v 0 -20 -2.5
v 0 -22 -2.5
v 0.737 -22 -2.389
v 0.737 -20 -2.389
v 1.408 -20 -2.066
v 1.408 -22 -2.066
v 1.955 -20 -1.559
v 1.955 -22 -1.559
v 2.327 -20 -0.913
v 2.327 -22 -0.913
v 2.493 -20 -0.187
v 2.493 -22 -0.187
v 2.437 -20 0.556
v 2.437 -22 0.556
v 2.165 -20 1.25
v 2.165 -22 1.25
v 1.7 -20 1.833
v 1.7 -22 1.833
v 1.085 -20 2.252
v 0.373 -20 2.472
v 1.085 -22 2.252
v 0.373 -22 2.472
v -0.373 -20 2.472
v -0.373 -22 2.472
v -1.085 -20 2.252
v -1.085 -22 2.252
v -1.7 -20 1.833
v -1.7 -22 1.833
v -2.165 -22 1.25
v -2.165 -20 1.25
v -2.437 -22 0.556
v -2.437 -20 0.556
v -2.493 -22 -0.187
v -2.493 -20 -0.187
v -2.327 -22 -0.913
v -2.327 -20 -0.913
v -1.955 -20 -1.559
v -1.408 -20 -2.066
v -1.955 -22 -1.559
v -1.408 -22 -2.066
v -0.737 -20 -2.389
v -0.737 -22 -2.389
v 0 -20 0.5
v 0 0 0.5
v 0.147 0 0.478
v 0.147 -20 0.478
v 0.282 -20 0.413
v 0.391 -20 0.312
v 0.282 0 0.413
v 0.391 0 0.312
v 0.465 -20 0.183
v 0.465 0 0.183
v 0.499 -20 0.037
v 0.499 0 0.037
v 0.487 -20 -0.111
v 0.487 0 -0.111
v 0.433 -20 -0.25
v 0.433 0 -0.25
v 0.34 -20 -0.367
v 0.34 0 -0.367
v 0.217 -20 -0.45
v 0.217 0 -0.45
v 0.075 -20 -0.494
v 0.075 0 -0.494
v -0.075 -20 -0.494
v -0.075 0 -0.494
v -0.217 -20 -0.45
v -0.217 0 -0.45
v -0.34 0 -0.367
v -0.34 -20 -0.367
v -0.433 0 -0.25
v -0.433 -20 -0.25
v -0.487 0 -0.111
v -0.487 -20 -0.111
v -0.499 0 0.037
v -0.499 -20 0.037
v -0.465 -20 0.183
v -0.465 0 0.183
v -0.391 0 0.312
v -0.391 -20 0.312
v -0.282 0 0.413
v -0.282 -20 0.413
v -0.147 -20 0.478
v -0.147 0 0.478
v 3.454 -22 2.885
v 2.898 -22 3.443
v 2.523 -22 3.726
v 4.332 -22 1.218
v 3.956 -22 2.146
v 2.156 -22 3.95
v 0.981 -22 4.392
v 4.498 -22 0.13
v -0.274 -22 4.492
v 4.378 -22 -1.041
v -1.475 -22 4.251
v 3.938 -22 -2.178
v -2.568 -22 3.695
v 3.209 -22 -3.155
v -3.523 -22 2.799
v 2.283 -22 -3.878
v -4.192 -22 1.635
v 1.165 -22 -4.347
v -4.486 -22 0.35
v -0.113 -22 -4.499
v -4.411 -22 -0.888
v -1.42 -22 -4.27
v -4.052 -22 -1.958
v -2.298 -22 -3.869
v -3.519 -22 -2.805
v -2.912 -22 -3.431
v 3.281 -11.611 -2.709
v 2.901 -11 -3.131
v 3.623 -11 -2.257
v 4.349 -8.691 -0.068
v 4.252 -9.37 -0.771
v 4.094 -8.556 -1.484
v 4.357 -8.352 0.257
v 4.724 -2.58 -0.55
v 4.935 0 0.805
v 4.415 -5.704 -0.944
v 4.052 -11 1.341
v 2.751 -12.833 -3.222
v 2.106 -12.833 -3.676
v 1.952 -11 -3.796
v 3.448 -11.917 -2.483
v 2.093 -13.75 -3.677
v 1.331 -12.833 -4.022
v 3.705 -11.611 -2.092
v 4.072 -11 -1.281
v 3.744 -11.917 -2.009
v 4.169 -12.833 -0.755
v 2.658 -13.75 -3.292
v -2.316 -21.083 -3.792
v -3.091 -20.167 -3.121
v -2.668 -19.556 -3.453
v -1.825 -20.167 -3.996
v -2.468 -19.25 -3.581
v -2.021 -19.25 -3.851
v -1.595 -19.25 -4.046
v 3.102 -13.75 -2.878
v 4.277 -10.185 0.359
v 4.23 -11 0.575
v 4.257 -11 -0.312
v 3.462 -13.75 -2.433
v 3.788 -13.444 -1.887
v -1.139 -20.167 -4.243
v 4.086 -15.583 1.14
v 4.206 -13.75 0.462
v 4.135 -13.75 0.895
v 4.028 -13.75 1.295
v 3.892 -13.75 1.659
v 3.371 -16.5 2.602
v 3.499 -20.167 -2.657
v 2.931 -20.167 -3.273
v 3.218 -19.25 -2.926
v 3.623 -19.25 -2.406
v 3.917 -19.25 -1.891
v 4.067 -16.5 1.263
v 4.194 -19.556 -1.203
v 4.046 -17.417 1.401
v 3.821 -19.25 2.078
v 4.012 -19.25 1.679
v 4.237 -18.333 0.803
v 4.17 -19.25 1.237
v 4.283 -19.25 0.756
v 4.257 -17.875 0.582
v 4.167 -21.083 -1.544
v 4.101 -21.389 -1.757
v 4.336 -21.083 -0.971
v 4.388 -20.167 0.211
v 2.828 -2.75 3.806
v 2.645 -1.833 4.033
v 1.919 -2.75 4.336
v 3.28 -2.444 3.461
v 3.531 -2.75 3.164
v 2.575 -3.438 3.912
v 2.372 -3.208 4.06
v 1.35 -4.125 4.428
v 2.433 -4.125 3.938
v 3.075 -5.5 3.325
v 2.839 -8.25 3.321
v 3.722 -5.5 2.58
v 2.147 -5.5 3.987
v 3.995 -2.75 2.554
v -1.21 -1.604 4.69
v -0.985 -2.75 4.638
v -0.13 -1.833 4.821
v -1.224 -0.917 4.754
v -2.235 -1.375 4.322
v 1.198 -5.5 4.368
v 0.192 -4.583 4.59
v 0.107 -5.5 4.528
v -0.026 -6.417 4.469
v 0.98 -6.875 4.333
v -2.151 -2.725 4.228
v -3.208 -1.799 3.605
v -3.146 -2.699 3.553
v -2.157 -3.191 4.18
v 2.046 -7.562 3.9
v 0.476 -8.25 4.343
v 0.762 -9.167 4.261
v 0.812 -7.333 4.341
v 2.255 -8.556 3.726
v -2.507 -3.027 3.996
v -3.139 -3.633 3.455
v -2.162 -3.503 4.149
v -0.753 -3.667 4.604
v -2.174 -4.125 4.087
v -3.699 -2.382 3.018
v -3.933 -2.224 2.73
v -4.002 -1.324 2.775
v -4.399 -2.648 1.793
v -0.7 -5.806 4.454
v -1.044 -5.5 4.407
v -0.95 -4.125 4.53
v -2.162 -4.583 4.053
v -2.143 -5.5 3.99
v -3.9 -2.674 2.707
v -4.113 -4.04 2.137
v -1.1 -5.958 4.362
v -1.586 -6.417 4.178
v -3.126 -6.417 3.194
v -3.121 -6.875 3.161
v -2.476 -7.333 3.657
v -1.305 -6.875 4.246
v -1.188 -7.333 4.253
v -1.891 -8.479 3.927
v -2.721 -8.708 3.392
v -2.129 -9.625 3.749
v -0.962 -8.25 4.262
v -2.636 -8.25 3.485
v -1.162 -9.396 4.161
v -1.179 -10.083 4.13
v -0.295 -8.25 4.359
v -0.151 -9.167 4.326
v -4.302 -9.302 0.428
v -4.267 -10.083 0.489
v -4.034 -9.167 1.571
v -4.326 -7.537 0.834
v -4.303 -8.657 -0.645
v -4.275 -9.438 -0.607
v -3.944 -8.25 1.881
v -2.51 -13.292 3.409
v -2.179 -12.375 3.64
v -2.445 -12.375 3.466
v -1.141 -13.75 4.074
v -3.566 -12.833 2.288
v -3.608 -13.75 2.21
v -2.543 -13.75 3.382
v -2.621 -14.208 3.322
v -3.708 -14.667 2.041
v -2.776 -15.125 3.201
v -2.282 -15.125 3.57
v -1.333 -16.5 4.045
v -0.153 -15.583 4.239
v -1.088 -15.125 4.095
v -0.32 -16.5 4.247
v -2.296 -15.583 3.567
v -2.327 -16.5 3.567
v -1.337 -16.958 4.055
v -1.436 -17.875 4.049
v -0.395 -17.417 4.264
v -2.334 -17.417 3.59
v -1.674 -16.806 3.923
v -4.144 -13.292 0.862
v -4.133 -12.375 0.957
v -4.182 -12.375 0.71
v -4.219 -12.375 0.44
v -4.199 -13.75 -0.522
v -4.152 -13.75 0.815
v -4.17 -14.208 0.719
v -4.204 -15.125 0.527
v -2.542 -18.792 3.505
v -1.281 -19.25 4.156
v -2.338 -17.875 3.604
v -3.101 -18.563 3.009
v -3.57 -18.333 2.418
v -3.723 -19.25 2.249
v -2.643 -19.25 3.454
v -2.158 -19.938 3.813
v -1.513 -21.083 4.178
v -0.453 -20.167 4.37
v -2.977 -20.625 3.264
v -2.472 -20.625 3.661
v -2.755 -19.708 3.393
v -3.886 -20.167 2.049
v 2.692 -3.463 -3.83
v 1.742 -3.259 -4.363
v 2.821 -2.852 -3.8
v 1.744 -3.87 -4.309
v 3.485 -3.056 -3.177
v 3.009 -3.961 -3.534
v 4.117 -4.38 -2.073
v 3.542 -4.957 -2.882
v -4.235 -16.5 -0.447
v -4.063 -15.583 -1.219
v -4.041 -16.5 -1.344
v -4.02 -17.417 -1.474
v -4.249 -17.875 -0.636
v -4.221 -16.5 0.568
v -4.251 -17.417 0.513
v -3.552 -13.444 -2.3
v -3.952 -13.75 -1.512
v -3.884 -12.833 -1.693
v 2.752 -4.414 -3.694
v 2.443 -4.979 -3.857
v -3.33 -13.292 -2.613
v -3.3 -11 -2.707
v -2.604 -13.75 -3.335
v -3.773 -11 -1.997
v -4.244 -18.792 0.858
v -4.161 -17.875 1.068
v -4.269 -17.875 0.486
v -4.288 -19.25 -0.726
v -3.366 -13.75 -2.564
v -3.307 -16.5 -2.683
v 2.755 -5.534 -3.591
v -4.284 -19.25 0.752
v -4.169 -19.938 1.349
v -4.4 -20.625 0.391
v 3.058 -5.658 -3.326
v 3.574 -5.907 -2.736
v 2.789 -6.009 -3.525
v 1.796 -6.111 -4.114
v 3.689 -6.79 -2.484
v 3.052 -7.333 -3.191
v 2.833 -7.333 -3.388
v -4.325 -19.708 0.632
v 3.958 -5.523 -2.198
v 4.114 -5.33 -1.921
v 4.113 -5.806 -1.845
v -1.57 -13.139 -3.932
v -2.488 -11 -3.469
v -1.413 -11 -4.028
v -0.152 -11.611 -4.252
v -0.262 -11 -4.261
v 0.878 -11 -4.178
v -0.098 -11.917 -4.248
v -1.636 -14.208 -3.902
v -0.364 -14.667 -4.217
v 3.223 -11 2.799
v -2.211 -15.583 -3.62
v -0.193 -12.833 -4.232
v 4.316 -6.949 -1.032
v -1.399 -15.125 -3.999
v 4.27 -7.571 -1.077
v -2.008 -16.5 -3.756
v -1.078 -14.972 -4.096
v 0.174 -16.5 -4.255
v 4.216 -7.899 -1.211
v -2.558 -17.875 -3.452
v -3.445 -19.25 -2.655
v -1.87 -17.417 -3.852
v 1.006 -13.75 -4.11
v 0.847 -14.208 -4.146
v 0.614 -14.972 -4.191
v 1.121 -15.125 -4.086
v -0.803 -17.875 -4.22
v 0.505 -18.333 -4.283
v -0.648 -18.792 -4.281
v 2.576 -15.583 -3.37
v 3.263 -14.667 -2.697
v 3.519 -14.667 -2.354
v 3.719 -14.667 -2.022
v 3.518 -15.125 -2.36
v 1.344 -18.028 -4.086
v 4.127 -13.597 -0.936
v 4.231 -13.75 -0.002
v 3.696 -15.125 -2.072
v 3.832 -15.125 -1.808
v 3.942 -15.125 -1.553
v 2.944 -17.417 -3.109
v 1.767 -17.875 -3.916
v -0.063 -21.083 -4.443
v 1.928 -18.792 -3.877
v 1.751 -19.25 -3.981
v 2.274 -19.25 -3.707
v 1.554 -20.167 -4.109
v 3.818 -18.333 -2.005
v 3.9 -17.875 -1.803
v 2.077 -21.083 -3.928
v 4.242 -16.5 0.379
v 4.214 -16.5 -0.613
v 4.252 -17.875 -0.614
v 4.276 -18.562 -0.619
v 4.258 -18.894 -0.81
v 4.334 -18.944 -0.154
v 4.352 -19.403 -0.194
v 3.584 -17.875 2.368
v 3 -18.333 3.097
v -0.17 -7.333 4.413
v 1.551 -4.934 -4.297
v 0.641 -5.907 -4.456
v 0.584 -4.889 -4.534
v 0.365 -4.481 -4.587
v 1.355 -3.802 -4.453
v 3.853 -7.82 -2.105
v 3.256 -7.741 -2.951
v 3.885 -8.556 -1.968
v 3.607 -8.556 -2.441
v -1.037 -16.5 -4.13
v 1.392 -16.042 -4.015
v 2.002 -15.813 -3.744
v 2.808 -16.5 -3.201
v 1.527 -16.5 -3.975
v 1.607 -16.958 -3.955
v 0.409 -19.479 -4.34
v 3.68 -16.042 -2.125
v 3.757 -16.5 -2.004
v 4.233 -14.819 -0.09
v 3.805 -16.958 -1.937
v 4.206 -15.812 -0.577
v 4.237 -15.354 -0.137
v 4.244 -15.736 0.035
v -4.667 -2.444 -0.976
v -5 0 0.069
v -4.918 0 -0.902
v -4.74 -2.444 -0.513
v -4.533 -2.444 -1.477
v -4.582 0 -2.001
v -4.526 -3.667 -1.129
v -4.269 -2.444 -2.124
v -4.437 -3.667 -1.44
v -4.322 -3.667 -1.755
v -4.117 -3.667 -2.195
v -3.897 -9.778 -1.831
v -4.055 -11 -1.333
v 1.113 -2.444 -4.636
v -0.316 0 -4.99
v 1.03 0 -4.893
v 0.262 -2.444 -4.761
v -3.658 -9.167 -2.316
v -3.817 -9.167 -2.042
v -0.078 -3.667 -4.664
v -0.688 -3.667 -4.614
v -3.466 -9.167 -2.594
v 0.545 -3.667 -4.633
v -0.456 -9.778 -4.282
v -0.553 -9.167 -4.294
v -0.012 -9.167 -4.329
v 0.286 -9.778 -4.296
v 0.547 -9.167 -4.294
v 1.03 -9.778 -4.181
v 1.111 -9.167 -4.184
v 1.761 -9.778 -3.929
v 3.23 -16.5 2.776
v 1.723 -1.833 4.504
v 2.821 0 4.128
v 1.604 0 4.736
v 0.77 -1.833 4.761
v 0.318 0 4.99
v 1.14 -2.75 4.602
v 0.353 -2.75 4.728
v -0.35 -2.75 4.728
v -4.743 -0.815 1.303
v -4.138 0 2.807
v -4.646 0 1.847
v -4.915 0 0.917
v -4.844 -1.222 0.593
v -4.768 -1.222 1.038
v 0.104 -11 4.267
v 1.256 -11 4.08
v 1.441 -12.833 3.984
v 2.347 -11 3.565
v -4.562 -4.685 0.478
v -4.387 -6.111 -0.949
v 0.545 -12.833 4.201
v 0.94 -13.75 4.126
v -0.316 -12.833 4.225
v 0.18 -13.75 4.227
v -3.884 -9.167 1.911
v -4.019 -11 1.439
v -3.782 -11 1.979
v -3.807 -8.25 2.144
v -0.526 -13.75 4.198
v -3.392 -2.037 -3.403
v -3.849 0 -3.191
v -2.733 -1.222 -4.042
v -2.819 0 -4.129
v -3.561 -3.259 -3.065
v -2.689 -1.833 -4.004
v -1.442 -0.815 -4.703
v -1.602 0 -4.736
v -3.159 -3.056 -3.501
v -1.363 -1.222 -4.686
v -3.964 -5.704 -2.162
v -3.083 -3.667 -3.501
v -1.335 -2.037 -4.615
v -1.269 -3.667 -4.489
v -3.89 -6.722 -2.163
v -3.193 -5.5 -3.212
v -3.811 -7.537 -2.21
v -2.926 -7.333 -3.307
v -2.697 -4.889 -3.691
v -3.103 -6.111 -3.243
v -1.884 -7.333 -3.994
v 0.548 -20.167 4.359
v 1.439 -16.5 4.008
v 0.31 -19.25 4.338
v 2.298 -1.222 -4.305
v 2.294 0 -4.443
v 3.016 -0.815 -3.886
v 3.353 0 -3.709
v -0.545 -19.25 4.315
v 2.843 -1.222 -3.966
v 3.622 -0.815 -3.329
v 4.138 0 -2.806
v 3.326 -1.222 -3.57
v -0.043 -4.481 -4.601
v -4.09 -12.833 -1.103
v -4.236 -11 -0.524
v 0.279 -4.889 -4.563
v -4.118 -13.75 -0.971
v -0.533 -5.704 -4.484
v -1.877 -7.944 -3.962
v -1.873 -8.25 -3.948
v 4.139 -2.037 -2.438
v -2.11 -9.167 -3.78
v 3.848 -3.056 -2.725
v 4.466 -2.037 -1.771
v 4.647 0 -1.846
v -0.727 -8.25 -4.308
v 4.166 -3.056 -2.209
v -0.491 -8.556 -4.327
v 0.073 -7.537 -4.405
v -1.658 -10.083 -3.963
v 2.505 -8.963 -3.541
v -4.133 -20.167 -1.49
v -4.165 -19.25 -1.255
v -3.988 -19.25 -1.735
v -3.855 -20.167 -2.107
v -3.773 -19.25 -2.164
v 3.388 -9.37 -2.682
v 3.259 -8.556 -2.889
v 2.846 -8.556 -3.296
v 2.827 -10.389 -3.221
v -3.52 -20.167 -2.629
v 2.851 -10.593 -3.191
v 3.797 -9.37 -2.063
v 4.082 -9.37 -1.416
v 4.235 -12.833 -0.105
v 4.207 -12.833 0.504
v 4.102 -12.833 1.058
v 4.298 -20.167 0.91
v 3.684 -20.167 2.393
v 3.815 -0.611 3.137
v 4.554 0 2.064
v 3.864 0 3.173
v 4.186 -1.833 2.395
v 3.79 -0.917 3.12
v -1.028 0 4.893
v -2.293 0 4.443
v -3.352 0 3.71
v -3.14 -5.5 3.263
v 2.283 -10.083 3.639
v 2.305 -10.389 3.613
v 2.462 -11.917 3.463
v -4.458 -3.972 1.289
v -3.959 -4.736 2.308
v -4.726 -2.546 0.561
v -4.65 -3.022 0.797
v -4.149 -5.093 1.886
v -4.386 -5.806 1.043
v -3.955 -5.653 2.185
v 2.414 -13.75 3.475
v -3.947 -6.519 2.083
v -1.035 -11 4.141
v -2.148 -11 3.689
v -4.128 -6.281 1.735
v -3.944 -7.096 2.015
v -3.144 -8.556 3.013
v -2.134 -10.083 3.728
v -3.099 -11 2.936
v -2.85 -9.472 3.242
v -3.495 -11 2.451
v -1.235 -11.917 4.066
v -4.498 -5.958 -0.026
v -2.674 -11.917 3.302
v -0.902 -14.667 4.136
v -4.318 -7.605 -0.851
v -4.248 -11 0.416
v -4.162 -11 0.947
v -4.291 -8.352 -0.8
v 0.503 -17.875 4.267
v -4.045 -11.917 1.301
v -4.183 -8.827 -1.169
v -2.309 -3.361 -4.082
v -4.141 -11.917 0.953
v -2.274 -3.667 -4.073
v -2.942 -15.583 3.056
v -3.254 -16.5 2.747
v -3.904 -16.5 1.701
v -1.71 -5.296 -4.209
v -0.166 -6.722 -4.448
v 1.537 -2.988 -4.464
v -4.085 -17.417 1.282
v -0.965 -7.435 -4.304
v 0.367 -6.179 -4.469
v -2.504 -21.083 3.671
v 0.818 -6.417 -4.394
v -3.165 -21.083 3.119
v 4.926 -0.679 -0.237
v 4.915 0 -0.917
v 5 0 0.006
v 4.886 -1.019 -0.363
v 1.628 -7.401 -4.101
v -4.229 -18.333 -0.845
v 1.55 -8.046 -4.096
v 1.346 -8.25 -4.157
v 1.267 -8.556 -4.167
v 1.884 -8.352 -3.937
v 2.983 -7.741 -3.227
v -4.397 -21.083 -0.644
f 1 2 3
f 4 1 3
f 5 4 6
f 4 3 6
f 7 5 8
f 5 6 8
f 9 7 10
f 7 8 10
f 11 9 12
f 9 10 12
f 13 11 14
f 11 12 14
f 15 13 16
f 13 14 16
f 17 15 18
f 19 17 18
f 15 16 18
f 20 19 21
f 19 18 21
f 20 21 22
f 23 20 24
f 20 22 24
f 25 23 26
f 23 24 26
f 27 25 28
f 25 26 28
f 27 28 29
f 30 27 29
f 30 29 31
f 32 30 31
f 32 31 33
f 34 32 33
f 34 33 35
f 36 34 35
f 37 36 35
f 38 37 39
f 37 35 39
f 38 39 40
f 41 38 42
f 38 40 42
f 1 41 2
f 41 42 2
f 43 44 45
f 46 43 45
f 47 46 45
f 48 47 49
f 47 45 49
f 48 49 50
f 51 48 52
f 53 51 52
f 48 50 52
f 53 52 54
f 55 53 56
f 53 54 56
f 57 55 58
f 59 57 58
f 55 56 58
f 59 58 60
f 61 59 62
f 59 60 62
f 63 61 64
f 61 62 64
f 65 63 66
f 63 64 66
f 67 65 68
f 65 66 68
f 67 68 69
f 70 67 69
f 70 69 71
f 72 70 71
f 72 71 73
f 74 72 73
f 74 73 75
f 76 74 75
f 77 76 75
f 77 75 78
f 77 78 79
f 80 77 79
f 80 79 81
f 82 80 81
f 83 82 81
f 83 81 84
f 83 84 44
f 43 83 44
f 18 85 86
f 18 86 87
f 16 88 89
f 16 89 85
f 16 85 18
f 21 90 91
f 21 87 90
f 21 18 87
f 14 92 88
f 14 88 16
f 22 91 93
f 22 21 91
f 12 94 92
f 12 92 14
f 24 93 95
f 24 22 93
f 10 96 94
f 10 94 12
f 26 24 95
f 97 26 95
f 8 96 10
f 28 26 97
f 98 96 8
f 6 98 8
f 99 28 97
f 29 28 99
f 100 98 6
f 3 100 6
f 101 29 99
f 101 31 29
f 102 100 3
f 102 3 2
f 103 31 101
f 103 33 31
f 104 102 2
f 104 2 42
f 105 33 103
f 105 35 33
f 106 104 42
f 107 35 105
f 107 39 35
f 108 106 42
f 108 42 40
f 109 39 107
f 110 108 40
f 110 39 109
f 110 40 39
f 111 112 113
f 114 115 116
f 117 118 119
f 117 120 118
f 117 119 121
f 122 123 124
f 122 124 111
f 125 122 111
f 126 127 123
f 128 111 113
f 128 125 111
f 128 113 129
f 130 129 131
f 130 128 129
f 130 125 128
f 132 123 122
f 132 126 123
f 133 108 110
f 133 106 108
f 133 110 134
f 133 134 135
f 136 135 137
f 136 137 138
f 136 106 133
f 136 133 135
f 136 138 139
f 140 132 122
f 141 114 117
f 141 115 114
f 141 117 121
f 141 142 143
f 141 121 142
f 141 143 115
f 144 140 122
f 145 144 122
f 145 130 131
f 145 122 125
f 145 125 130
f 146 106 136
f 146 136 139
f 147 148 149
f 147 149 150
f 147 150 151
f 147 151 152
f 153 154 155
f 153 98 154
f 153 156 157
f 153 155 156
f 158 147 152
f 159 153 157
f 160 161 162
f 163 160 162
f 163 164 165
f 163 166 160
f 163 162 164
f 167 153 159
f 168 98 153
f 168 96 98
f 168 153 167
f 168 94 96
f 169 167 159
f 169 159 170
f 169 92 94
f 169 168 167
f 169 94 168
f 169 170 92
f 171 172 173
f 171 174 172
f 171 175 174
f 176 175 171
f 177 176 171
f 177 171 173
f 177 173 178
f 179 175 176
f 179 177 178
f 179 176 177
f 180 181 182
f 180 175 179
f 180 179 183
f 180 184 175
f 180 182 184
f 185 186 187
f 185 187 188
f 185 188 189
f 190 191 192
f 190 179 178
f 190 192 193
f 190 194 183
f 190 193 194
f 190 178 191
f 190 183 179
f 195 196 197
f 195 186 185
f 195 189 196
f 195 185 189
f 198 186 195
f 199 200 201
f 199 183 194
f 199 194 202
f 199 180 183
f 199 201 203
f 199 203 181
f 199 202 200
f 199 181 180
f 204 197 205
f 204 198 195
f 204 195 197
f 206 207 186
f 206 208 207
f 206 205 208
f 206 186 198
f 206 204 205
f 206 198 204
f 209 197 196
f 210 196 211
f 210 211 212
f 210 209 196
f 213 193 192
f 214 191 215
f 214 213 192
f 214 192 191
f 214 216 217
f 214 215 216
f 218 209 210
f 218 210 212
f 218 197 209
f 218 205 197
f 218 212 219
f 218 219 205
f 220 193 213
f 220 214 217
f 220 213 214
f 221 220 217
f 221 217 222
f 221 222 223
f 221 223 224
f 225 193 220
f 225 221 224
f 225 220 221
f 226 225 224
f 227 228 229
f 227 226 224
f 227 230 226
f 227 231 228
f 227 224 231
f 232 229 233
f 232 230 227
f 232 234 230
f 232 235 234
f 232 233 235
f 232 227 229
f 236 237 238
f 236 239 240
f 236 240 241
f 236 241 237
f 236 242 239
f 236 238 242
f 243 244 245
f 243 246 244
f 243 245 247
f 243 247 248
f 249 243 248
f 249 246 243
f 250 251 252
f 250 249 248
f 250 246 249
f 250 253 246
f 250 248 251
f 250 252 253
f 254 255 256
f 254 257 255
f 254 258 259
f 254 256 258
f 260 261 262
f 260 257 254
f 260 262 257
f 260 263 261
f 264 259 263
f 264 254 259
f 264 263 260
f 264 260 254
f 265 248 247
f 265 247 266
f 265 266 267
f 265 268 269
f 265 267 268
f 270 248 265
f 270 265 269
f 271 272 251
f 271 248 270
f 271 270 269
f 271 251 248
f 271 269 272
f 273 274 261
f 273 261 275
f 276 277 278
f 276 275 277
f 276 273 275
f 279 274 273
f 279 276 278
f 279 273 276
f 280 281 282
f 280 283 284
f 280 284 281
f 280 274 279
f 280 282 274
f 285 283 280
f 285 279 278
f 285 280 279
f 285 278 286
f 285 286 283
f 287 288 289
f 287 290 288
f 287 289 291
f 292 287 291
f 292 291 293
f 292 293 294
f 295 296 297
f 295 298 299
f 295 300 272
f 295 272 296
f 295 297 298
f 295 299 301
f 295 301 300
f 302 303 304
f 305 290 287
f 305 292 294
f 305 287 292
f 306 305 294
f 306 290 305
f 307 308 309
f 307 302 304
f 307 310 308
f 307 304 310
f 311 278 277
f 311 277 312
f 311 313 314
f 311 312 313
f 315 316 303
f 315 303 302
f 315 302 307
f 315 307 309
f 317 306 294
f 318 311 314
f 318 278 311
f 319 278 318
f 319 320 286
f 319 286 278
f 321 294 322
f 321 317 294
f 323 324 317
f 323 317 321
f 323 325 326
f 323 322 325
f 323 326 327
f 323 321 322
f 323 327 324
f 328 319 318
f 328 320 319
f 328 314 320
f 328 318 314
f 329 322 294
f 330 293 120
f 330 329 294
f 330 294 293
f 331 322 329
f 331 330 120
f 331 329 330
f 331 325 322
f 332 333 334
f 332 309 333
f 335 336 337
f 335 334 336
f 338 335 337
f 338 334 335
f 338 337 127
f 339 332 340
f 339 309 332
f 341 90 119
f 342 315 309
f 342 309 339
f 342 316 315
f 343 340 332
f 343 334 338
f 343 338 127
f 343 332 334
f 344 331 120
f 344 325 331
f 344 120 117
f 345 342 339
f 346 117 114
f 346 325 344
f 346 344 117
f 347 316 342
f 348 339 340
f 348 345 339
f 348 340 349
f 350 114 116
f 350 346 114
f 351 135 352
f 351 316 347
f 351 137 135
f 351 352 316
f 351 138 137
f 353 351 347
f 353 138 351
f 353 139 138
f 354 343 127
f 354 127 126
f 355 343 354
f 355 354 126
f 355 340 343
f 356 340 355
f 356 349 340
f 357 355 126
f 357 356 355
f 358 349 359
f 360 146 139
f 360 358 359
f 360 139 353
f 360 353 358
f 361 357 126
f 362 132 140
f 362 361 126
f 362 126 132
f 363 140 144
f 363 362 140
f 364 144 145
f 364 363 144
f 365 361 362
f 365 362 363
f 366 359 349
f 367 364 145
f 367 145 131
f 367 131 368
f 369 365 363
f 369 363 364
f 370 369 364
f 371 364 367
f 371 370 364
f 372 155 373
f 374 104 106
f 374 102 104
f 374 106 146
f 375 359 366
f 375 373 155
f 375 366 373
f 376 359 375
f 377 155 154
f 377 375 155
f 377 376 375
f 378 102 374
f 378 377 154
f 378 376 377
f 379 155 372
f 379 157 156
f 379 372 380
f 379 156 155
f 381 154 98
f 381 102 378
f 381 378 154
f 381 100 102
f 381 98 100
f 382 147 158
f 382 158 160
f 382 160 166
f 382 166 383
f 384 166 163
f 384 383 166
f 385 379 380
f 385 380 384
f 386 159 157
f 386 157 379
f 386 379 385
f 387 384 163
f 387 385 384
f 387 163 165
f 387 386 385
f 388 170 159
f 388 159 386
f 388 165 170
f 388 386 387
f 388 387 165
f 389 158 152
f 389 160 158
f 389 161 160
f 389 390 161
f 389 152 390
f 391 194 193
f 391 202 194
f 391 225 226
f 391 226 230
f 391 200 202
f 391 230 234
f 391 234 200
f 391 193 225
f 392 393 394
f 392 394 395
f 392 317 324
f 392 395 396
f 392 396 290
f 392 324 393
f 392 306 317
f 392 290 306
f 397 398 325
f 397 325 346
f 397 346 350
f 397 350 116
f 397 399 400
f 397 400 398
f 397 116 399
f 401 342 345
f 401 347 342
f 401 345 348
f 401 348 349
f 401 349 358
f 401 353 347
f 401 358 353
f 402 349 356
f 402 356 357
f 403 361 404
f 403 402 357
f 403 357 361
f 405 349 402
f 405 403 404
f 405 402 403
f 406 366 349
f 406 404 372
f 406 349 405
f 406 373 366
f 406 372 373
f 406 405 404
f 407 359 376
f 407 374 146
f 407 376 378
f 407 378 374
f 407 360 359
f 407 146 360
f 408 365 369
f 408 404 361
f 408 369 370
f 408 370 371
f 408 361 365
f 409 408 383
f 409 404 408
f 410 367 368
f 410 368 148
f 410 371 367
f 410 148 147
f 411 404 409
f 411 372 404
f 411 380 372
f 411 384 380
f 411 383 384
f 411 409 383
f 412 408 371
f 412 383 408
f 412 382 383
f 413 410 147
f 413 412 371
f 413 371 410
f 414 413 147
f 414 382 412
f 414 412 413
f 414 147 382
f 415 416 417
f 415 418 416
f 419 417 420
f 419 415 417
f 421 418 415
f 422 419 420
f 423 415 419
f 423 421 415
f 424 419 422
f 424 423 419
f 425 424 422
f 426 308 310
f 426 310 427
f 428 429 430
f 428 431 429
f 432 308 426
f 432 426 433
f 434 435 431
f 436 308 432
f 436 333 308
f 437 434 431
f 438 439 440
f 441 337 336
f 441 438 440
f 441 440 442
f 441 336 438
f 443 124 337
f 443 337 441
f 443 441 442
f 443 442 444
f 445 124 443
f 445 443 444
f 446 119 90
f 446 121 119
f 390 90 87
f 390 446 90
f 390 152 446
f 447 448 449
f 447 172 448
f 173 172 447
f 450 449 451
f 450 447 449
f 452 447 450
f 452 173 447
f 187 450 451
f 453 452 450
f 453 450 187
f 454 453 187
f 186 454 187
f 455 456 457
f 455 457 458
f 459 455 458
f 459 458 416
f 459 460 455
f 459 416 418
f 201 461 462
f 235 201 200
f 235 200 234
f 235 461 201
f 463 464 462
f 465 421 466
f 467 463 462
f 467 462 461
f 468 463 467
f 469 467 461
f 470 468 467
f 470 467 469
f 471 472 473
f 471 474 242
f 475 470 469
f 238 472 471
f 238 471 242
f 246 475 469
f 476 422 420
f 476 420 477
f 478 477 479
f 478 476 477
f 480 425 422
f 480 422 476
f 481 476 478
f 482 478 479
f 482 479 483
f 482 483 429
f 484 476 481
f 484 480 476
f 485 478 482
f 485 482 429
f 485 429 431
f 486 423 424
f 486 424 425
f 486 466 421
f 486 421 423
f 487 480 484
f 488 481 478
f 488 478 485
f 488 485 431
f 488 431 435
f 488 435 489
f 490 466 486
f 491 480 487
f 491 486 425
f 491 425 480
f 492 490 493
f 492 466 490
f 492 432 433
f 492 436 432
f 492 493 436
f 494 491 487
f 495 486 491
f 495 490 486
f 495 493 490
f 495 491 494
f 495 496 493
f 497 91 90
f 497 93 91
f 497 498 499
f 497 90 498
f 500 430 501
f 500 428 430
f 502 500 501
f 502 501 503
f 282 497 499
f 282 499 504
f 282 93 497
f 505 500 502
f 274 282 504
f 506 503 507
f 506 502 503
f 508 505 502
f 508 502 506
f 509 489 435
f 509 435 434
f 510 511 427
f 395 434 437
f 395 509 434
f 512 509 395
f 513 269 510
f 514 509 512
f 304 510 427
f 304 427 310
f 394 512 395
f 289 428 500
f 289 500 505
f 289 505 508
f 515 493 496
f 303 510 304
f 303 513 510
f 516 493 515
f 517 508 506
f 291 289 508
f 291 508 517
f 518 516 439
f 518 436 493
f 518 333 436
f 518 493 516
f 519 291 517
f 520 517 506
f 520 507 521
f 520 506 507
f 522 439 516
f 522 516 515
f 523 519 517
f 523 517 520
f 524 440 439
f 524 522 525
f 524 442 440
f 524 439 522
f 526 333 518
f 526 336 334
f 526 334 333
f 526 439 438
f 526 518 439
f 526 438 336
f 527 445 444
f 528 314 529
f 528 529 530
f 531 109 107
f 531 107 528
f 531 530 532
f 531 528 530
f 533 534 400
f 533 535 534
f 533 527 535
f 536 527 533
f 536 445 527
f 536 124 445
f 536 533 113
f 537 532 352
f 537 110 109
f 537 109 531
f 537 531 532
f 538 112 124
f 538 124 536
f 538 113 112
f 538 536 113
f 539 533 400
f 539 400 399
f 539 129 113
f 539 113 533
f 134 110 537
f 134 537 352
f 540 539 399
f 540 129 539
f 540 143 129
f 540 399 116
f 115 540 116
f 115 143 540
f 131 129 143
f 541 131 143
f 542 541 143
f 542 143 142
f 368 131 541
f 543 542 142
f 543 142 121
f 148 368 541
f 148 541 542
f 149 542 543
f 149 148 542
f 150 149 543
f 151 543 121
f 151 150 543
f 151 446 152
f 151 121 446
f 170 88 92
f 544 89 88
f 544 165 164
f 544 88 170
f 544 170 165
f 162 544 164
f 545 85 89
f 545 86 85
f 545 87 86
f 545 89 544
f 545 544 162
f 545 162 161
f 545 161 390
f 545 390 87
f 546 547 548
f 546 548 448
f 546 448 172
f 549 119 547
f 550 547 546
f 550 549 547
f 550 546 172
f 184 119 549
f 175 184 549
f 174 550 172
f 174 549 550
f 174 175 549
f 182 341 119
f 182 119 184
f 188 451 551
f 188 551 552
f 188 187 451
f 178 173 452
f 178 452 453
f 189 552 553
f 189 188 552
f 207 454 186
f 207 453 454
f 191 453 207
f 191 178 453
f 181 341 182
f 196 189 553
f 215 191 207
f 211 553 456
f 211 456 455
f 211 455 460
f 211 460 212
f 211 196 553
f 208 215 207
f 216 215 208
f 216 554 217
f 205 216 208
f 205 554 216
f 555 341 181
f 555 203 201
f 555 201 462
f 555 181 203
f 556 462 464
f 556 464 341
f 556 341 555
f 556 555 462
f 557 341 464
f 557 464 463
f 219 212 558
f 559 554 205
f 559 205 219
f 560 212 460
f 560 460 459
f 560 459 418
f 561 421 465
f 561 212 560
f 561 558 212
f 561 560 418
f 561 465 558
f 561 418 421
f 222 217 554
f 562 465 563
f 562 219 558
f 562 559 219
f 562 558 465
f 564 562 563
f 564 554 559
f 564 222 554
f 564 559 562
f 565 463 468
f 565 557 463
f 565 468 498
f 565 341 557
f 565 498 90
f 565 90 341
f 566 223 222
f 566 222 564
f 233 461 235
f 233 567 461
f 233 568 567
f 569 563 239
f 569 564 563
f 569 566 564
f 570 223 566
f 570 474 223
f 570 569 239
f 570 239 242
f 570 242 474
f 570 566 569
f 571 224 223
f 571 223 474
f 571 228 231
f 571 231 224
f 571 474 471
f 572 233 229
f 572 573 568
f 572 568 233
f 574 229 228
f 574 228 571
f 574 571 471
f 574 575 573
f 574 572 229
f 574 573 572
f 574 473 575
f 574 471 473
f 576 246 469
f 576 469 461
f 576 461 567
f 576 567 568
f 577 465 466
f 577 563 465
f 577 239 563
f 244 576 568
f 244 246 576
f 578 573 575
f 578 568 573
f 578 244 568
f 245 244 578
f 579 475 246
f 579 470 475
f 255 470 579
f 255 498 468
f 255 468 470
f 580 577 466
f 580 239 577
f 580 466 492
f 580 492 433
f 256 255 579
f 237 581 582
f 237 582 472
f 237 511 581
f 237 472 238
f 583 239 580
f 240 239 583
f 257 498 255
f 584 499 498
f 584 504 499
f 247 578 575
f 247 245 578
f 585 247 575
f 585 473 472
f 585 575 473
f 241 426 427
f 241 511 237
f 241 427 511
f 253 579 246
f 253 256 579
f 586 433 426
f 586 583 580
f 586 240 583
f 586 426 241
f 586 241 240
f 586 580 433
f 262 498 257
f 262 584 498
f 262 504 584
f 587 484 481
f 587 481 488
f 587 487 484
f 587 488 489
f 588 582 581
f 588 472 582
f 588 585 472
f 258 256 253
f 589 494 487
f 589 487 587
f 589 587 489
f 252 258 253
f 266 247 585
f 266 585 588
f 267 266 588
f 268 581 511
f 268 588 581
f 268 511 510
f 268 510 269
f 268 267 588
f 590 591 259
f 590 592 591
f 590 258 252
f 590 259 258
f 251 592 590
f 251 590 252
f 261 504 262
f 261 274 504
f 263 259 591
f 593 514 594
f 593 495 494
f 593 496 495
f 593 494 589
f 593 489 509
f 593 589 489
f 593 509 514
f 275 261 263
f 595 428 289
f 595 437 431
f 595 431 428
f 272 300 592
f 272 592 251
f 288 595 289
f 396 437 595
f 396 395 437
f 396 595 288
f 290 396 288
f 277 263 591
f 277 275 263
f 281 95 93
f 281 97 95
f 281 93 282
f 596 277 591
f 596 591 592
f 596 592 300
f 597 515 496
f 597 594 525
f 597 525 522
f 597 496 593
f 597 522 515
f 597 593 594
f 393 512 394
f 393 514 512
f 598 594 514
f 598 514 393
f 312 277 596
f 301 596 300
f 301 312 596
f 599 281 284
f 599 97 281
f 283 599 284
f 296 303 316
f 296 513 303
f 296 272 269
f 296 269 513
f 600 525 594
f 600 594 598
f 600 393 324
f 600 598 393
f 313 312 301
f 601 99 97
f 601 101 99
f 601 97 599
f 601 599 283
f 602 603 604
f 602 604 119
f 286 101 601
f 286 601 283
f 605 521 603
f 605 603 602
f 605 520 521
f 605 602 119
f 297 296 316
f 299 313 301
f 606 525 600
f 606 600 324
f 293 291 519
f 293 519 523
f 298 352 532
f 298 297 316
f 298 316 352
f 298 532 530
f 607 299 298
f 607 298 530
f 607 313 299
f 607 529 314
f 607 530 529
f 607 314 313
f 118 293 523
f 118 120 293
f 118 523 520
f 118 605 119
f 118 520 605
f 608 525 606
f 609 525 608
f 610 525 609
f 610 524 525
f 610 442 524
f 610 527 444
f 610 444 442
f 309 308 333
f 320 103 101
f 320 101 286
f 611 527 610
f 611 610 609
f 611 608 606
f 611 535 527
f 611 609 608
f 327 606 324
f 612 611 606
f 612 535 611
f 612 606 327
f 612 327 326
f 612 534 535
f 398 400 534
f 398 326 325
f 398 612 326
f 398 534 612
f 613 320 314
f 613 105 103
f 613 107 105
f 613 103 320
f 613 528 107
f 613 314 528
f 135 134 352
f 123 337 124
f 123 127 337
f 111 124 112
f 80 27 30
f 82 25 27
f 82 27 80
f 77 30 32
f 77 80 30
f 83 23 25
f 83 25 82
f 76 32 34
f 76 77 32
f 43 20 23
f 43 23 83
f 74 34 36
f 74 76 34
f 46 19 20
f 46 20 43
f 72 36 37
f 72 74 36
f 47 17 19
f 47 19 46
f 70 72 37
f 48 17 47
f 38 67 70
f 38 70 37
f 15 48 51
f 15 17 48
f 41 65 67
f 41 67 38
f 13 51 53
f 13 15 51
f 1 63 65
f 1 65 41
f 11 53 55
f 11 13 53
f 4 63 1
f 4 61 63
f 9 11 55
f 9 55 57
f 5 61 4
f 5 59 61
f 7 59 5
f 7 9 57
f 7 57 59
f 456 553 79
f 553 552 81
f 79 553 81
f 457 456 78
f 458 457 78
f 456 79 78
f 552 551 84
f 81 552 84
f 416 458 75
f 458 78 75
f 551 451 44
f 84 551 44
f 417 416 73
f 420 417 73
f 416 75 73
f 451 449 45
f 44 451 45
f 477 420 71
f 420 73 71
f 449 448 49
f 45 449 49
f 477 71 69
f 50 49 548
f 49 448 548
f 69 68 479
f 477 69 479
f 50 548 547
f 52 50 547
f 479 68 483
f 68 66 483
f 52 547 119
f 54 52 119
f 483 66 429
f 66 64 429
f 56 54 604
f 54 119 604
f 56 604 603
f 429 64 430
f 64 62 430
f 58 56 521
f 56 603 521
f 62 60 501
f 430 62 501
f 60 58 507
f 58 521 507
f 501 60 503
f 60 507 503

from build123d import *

# Parameters (mm, degrees)
SKETCH4_R          = 0.5
CUT_EXTRUDE1_DEPTH = 24.108440155
SKETCH5_R          = 2.5
CUT_EXTRUDE2_DEPTH = 2


with BuildPart() as part:
    # Loft1: read off the stored shape, not the designer's step
    # Loft1: loft between two sections, ruled curve by curve
    loft1_from = [
        Edge.make_bspline([(4.934796286, 0, 0.8048513), (3.325093686, 0, 10.674443872), (-6.544498886, 0, 9.064741272), (-4.934796286, 0, -0.8048513), (-3.325093686, 0, -10.674443872), (6.544498886, 0, -9.064741272), (4.934796286, 0, 0.8048513)], [0, 0, 0, 0, 0.5, 0.5, 0.5, 1, 1, 1, 1], 3, [1, 0.333333333, 0.333333333, 1, 0.333333333, 0.333333333, 1]),
    ]
    loft1_to = [
        Edge.make_bspline([(2.155997578, -22, 3.949895498), (-5.743793417, -22, 8.261890654), (-10.055788574, -22, 0.362099658), (-2.155997578, -22, -3.949895498), (5.743793417, -22, -8.261890654), (10.055788574, -22, -0.362099658), (2.155997578, -22, 3.949895498)], [0, 0, 0, 0, 0.5, 0.5, 0.5, 1, 1, 1, 1], 3, [1, 0.333333333, 0.333333333, 1, 0.333333333, 0.333333333, 1]),
    ]
    loft1 = Solid(Shell([*[Face.make_surface_from_curves(loft1_from[k], loft1_to[k]) for k in range(1)], Face(Wire(loft1_from)), Face(Wire(loft1_to))]))
    add(loft1)

    # Sketch4 → Cut-Extrude1 (cut, through all)
    with BuildSketch(Plane(origin=(0, 0, 0), x_dir=(1, 0, 0), z_dir=(0, 1, 0))):
        with Locations(Location((0, 0, 0), (0, 0, 270))):
            Circle(SKETCH4_R)
    extrude(amount=-CUT_EXTRUDE1_DEPTH, mode=Mode.SUBTRACT)

    # Sketch5 → Cut-Extrude2 (cut)
    with BuildSketch(Plane.XZ.offset(22)):
        with Locations(Location((0, 0, 0), (0, 0, 270))):
            Circle(SKETCH5_R)
    extrude(amount=-CUT_EXTRUDE2_DEPTH, mode=Mode.SUBTRACT)


solid = part.part
